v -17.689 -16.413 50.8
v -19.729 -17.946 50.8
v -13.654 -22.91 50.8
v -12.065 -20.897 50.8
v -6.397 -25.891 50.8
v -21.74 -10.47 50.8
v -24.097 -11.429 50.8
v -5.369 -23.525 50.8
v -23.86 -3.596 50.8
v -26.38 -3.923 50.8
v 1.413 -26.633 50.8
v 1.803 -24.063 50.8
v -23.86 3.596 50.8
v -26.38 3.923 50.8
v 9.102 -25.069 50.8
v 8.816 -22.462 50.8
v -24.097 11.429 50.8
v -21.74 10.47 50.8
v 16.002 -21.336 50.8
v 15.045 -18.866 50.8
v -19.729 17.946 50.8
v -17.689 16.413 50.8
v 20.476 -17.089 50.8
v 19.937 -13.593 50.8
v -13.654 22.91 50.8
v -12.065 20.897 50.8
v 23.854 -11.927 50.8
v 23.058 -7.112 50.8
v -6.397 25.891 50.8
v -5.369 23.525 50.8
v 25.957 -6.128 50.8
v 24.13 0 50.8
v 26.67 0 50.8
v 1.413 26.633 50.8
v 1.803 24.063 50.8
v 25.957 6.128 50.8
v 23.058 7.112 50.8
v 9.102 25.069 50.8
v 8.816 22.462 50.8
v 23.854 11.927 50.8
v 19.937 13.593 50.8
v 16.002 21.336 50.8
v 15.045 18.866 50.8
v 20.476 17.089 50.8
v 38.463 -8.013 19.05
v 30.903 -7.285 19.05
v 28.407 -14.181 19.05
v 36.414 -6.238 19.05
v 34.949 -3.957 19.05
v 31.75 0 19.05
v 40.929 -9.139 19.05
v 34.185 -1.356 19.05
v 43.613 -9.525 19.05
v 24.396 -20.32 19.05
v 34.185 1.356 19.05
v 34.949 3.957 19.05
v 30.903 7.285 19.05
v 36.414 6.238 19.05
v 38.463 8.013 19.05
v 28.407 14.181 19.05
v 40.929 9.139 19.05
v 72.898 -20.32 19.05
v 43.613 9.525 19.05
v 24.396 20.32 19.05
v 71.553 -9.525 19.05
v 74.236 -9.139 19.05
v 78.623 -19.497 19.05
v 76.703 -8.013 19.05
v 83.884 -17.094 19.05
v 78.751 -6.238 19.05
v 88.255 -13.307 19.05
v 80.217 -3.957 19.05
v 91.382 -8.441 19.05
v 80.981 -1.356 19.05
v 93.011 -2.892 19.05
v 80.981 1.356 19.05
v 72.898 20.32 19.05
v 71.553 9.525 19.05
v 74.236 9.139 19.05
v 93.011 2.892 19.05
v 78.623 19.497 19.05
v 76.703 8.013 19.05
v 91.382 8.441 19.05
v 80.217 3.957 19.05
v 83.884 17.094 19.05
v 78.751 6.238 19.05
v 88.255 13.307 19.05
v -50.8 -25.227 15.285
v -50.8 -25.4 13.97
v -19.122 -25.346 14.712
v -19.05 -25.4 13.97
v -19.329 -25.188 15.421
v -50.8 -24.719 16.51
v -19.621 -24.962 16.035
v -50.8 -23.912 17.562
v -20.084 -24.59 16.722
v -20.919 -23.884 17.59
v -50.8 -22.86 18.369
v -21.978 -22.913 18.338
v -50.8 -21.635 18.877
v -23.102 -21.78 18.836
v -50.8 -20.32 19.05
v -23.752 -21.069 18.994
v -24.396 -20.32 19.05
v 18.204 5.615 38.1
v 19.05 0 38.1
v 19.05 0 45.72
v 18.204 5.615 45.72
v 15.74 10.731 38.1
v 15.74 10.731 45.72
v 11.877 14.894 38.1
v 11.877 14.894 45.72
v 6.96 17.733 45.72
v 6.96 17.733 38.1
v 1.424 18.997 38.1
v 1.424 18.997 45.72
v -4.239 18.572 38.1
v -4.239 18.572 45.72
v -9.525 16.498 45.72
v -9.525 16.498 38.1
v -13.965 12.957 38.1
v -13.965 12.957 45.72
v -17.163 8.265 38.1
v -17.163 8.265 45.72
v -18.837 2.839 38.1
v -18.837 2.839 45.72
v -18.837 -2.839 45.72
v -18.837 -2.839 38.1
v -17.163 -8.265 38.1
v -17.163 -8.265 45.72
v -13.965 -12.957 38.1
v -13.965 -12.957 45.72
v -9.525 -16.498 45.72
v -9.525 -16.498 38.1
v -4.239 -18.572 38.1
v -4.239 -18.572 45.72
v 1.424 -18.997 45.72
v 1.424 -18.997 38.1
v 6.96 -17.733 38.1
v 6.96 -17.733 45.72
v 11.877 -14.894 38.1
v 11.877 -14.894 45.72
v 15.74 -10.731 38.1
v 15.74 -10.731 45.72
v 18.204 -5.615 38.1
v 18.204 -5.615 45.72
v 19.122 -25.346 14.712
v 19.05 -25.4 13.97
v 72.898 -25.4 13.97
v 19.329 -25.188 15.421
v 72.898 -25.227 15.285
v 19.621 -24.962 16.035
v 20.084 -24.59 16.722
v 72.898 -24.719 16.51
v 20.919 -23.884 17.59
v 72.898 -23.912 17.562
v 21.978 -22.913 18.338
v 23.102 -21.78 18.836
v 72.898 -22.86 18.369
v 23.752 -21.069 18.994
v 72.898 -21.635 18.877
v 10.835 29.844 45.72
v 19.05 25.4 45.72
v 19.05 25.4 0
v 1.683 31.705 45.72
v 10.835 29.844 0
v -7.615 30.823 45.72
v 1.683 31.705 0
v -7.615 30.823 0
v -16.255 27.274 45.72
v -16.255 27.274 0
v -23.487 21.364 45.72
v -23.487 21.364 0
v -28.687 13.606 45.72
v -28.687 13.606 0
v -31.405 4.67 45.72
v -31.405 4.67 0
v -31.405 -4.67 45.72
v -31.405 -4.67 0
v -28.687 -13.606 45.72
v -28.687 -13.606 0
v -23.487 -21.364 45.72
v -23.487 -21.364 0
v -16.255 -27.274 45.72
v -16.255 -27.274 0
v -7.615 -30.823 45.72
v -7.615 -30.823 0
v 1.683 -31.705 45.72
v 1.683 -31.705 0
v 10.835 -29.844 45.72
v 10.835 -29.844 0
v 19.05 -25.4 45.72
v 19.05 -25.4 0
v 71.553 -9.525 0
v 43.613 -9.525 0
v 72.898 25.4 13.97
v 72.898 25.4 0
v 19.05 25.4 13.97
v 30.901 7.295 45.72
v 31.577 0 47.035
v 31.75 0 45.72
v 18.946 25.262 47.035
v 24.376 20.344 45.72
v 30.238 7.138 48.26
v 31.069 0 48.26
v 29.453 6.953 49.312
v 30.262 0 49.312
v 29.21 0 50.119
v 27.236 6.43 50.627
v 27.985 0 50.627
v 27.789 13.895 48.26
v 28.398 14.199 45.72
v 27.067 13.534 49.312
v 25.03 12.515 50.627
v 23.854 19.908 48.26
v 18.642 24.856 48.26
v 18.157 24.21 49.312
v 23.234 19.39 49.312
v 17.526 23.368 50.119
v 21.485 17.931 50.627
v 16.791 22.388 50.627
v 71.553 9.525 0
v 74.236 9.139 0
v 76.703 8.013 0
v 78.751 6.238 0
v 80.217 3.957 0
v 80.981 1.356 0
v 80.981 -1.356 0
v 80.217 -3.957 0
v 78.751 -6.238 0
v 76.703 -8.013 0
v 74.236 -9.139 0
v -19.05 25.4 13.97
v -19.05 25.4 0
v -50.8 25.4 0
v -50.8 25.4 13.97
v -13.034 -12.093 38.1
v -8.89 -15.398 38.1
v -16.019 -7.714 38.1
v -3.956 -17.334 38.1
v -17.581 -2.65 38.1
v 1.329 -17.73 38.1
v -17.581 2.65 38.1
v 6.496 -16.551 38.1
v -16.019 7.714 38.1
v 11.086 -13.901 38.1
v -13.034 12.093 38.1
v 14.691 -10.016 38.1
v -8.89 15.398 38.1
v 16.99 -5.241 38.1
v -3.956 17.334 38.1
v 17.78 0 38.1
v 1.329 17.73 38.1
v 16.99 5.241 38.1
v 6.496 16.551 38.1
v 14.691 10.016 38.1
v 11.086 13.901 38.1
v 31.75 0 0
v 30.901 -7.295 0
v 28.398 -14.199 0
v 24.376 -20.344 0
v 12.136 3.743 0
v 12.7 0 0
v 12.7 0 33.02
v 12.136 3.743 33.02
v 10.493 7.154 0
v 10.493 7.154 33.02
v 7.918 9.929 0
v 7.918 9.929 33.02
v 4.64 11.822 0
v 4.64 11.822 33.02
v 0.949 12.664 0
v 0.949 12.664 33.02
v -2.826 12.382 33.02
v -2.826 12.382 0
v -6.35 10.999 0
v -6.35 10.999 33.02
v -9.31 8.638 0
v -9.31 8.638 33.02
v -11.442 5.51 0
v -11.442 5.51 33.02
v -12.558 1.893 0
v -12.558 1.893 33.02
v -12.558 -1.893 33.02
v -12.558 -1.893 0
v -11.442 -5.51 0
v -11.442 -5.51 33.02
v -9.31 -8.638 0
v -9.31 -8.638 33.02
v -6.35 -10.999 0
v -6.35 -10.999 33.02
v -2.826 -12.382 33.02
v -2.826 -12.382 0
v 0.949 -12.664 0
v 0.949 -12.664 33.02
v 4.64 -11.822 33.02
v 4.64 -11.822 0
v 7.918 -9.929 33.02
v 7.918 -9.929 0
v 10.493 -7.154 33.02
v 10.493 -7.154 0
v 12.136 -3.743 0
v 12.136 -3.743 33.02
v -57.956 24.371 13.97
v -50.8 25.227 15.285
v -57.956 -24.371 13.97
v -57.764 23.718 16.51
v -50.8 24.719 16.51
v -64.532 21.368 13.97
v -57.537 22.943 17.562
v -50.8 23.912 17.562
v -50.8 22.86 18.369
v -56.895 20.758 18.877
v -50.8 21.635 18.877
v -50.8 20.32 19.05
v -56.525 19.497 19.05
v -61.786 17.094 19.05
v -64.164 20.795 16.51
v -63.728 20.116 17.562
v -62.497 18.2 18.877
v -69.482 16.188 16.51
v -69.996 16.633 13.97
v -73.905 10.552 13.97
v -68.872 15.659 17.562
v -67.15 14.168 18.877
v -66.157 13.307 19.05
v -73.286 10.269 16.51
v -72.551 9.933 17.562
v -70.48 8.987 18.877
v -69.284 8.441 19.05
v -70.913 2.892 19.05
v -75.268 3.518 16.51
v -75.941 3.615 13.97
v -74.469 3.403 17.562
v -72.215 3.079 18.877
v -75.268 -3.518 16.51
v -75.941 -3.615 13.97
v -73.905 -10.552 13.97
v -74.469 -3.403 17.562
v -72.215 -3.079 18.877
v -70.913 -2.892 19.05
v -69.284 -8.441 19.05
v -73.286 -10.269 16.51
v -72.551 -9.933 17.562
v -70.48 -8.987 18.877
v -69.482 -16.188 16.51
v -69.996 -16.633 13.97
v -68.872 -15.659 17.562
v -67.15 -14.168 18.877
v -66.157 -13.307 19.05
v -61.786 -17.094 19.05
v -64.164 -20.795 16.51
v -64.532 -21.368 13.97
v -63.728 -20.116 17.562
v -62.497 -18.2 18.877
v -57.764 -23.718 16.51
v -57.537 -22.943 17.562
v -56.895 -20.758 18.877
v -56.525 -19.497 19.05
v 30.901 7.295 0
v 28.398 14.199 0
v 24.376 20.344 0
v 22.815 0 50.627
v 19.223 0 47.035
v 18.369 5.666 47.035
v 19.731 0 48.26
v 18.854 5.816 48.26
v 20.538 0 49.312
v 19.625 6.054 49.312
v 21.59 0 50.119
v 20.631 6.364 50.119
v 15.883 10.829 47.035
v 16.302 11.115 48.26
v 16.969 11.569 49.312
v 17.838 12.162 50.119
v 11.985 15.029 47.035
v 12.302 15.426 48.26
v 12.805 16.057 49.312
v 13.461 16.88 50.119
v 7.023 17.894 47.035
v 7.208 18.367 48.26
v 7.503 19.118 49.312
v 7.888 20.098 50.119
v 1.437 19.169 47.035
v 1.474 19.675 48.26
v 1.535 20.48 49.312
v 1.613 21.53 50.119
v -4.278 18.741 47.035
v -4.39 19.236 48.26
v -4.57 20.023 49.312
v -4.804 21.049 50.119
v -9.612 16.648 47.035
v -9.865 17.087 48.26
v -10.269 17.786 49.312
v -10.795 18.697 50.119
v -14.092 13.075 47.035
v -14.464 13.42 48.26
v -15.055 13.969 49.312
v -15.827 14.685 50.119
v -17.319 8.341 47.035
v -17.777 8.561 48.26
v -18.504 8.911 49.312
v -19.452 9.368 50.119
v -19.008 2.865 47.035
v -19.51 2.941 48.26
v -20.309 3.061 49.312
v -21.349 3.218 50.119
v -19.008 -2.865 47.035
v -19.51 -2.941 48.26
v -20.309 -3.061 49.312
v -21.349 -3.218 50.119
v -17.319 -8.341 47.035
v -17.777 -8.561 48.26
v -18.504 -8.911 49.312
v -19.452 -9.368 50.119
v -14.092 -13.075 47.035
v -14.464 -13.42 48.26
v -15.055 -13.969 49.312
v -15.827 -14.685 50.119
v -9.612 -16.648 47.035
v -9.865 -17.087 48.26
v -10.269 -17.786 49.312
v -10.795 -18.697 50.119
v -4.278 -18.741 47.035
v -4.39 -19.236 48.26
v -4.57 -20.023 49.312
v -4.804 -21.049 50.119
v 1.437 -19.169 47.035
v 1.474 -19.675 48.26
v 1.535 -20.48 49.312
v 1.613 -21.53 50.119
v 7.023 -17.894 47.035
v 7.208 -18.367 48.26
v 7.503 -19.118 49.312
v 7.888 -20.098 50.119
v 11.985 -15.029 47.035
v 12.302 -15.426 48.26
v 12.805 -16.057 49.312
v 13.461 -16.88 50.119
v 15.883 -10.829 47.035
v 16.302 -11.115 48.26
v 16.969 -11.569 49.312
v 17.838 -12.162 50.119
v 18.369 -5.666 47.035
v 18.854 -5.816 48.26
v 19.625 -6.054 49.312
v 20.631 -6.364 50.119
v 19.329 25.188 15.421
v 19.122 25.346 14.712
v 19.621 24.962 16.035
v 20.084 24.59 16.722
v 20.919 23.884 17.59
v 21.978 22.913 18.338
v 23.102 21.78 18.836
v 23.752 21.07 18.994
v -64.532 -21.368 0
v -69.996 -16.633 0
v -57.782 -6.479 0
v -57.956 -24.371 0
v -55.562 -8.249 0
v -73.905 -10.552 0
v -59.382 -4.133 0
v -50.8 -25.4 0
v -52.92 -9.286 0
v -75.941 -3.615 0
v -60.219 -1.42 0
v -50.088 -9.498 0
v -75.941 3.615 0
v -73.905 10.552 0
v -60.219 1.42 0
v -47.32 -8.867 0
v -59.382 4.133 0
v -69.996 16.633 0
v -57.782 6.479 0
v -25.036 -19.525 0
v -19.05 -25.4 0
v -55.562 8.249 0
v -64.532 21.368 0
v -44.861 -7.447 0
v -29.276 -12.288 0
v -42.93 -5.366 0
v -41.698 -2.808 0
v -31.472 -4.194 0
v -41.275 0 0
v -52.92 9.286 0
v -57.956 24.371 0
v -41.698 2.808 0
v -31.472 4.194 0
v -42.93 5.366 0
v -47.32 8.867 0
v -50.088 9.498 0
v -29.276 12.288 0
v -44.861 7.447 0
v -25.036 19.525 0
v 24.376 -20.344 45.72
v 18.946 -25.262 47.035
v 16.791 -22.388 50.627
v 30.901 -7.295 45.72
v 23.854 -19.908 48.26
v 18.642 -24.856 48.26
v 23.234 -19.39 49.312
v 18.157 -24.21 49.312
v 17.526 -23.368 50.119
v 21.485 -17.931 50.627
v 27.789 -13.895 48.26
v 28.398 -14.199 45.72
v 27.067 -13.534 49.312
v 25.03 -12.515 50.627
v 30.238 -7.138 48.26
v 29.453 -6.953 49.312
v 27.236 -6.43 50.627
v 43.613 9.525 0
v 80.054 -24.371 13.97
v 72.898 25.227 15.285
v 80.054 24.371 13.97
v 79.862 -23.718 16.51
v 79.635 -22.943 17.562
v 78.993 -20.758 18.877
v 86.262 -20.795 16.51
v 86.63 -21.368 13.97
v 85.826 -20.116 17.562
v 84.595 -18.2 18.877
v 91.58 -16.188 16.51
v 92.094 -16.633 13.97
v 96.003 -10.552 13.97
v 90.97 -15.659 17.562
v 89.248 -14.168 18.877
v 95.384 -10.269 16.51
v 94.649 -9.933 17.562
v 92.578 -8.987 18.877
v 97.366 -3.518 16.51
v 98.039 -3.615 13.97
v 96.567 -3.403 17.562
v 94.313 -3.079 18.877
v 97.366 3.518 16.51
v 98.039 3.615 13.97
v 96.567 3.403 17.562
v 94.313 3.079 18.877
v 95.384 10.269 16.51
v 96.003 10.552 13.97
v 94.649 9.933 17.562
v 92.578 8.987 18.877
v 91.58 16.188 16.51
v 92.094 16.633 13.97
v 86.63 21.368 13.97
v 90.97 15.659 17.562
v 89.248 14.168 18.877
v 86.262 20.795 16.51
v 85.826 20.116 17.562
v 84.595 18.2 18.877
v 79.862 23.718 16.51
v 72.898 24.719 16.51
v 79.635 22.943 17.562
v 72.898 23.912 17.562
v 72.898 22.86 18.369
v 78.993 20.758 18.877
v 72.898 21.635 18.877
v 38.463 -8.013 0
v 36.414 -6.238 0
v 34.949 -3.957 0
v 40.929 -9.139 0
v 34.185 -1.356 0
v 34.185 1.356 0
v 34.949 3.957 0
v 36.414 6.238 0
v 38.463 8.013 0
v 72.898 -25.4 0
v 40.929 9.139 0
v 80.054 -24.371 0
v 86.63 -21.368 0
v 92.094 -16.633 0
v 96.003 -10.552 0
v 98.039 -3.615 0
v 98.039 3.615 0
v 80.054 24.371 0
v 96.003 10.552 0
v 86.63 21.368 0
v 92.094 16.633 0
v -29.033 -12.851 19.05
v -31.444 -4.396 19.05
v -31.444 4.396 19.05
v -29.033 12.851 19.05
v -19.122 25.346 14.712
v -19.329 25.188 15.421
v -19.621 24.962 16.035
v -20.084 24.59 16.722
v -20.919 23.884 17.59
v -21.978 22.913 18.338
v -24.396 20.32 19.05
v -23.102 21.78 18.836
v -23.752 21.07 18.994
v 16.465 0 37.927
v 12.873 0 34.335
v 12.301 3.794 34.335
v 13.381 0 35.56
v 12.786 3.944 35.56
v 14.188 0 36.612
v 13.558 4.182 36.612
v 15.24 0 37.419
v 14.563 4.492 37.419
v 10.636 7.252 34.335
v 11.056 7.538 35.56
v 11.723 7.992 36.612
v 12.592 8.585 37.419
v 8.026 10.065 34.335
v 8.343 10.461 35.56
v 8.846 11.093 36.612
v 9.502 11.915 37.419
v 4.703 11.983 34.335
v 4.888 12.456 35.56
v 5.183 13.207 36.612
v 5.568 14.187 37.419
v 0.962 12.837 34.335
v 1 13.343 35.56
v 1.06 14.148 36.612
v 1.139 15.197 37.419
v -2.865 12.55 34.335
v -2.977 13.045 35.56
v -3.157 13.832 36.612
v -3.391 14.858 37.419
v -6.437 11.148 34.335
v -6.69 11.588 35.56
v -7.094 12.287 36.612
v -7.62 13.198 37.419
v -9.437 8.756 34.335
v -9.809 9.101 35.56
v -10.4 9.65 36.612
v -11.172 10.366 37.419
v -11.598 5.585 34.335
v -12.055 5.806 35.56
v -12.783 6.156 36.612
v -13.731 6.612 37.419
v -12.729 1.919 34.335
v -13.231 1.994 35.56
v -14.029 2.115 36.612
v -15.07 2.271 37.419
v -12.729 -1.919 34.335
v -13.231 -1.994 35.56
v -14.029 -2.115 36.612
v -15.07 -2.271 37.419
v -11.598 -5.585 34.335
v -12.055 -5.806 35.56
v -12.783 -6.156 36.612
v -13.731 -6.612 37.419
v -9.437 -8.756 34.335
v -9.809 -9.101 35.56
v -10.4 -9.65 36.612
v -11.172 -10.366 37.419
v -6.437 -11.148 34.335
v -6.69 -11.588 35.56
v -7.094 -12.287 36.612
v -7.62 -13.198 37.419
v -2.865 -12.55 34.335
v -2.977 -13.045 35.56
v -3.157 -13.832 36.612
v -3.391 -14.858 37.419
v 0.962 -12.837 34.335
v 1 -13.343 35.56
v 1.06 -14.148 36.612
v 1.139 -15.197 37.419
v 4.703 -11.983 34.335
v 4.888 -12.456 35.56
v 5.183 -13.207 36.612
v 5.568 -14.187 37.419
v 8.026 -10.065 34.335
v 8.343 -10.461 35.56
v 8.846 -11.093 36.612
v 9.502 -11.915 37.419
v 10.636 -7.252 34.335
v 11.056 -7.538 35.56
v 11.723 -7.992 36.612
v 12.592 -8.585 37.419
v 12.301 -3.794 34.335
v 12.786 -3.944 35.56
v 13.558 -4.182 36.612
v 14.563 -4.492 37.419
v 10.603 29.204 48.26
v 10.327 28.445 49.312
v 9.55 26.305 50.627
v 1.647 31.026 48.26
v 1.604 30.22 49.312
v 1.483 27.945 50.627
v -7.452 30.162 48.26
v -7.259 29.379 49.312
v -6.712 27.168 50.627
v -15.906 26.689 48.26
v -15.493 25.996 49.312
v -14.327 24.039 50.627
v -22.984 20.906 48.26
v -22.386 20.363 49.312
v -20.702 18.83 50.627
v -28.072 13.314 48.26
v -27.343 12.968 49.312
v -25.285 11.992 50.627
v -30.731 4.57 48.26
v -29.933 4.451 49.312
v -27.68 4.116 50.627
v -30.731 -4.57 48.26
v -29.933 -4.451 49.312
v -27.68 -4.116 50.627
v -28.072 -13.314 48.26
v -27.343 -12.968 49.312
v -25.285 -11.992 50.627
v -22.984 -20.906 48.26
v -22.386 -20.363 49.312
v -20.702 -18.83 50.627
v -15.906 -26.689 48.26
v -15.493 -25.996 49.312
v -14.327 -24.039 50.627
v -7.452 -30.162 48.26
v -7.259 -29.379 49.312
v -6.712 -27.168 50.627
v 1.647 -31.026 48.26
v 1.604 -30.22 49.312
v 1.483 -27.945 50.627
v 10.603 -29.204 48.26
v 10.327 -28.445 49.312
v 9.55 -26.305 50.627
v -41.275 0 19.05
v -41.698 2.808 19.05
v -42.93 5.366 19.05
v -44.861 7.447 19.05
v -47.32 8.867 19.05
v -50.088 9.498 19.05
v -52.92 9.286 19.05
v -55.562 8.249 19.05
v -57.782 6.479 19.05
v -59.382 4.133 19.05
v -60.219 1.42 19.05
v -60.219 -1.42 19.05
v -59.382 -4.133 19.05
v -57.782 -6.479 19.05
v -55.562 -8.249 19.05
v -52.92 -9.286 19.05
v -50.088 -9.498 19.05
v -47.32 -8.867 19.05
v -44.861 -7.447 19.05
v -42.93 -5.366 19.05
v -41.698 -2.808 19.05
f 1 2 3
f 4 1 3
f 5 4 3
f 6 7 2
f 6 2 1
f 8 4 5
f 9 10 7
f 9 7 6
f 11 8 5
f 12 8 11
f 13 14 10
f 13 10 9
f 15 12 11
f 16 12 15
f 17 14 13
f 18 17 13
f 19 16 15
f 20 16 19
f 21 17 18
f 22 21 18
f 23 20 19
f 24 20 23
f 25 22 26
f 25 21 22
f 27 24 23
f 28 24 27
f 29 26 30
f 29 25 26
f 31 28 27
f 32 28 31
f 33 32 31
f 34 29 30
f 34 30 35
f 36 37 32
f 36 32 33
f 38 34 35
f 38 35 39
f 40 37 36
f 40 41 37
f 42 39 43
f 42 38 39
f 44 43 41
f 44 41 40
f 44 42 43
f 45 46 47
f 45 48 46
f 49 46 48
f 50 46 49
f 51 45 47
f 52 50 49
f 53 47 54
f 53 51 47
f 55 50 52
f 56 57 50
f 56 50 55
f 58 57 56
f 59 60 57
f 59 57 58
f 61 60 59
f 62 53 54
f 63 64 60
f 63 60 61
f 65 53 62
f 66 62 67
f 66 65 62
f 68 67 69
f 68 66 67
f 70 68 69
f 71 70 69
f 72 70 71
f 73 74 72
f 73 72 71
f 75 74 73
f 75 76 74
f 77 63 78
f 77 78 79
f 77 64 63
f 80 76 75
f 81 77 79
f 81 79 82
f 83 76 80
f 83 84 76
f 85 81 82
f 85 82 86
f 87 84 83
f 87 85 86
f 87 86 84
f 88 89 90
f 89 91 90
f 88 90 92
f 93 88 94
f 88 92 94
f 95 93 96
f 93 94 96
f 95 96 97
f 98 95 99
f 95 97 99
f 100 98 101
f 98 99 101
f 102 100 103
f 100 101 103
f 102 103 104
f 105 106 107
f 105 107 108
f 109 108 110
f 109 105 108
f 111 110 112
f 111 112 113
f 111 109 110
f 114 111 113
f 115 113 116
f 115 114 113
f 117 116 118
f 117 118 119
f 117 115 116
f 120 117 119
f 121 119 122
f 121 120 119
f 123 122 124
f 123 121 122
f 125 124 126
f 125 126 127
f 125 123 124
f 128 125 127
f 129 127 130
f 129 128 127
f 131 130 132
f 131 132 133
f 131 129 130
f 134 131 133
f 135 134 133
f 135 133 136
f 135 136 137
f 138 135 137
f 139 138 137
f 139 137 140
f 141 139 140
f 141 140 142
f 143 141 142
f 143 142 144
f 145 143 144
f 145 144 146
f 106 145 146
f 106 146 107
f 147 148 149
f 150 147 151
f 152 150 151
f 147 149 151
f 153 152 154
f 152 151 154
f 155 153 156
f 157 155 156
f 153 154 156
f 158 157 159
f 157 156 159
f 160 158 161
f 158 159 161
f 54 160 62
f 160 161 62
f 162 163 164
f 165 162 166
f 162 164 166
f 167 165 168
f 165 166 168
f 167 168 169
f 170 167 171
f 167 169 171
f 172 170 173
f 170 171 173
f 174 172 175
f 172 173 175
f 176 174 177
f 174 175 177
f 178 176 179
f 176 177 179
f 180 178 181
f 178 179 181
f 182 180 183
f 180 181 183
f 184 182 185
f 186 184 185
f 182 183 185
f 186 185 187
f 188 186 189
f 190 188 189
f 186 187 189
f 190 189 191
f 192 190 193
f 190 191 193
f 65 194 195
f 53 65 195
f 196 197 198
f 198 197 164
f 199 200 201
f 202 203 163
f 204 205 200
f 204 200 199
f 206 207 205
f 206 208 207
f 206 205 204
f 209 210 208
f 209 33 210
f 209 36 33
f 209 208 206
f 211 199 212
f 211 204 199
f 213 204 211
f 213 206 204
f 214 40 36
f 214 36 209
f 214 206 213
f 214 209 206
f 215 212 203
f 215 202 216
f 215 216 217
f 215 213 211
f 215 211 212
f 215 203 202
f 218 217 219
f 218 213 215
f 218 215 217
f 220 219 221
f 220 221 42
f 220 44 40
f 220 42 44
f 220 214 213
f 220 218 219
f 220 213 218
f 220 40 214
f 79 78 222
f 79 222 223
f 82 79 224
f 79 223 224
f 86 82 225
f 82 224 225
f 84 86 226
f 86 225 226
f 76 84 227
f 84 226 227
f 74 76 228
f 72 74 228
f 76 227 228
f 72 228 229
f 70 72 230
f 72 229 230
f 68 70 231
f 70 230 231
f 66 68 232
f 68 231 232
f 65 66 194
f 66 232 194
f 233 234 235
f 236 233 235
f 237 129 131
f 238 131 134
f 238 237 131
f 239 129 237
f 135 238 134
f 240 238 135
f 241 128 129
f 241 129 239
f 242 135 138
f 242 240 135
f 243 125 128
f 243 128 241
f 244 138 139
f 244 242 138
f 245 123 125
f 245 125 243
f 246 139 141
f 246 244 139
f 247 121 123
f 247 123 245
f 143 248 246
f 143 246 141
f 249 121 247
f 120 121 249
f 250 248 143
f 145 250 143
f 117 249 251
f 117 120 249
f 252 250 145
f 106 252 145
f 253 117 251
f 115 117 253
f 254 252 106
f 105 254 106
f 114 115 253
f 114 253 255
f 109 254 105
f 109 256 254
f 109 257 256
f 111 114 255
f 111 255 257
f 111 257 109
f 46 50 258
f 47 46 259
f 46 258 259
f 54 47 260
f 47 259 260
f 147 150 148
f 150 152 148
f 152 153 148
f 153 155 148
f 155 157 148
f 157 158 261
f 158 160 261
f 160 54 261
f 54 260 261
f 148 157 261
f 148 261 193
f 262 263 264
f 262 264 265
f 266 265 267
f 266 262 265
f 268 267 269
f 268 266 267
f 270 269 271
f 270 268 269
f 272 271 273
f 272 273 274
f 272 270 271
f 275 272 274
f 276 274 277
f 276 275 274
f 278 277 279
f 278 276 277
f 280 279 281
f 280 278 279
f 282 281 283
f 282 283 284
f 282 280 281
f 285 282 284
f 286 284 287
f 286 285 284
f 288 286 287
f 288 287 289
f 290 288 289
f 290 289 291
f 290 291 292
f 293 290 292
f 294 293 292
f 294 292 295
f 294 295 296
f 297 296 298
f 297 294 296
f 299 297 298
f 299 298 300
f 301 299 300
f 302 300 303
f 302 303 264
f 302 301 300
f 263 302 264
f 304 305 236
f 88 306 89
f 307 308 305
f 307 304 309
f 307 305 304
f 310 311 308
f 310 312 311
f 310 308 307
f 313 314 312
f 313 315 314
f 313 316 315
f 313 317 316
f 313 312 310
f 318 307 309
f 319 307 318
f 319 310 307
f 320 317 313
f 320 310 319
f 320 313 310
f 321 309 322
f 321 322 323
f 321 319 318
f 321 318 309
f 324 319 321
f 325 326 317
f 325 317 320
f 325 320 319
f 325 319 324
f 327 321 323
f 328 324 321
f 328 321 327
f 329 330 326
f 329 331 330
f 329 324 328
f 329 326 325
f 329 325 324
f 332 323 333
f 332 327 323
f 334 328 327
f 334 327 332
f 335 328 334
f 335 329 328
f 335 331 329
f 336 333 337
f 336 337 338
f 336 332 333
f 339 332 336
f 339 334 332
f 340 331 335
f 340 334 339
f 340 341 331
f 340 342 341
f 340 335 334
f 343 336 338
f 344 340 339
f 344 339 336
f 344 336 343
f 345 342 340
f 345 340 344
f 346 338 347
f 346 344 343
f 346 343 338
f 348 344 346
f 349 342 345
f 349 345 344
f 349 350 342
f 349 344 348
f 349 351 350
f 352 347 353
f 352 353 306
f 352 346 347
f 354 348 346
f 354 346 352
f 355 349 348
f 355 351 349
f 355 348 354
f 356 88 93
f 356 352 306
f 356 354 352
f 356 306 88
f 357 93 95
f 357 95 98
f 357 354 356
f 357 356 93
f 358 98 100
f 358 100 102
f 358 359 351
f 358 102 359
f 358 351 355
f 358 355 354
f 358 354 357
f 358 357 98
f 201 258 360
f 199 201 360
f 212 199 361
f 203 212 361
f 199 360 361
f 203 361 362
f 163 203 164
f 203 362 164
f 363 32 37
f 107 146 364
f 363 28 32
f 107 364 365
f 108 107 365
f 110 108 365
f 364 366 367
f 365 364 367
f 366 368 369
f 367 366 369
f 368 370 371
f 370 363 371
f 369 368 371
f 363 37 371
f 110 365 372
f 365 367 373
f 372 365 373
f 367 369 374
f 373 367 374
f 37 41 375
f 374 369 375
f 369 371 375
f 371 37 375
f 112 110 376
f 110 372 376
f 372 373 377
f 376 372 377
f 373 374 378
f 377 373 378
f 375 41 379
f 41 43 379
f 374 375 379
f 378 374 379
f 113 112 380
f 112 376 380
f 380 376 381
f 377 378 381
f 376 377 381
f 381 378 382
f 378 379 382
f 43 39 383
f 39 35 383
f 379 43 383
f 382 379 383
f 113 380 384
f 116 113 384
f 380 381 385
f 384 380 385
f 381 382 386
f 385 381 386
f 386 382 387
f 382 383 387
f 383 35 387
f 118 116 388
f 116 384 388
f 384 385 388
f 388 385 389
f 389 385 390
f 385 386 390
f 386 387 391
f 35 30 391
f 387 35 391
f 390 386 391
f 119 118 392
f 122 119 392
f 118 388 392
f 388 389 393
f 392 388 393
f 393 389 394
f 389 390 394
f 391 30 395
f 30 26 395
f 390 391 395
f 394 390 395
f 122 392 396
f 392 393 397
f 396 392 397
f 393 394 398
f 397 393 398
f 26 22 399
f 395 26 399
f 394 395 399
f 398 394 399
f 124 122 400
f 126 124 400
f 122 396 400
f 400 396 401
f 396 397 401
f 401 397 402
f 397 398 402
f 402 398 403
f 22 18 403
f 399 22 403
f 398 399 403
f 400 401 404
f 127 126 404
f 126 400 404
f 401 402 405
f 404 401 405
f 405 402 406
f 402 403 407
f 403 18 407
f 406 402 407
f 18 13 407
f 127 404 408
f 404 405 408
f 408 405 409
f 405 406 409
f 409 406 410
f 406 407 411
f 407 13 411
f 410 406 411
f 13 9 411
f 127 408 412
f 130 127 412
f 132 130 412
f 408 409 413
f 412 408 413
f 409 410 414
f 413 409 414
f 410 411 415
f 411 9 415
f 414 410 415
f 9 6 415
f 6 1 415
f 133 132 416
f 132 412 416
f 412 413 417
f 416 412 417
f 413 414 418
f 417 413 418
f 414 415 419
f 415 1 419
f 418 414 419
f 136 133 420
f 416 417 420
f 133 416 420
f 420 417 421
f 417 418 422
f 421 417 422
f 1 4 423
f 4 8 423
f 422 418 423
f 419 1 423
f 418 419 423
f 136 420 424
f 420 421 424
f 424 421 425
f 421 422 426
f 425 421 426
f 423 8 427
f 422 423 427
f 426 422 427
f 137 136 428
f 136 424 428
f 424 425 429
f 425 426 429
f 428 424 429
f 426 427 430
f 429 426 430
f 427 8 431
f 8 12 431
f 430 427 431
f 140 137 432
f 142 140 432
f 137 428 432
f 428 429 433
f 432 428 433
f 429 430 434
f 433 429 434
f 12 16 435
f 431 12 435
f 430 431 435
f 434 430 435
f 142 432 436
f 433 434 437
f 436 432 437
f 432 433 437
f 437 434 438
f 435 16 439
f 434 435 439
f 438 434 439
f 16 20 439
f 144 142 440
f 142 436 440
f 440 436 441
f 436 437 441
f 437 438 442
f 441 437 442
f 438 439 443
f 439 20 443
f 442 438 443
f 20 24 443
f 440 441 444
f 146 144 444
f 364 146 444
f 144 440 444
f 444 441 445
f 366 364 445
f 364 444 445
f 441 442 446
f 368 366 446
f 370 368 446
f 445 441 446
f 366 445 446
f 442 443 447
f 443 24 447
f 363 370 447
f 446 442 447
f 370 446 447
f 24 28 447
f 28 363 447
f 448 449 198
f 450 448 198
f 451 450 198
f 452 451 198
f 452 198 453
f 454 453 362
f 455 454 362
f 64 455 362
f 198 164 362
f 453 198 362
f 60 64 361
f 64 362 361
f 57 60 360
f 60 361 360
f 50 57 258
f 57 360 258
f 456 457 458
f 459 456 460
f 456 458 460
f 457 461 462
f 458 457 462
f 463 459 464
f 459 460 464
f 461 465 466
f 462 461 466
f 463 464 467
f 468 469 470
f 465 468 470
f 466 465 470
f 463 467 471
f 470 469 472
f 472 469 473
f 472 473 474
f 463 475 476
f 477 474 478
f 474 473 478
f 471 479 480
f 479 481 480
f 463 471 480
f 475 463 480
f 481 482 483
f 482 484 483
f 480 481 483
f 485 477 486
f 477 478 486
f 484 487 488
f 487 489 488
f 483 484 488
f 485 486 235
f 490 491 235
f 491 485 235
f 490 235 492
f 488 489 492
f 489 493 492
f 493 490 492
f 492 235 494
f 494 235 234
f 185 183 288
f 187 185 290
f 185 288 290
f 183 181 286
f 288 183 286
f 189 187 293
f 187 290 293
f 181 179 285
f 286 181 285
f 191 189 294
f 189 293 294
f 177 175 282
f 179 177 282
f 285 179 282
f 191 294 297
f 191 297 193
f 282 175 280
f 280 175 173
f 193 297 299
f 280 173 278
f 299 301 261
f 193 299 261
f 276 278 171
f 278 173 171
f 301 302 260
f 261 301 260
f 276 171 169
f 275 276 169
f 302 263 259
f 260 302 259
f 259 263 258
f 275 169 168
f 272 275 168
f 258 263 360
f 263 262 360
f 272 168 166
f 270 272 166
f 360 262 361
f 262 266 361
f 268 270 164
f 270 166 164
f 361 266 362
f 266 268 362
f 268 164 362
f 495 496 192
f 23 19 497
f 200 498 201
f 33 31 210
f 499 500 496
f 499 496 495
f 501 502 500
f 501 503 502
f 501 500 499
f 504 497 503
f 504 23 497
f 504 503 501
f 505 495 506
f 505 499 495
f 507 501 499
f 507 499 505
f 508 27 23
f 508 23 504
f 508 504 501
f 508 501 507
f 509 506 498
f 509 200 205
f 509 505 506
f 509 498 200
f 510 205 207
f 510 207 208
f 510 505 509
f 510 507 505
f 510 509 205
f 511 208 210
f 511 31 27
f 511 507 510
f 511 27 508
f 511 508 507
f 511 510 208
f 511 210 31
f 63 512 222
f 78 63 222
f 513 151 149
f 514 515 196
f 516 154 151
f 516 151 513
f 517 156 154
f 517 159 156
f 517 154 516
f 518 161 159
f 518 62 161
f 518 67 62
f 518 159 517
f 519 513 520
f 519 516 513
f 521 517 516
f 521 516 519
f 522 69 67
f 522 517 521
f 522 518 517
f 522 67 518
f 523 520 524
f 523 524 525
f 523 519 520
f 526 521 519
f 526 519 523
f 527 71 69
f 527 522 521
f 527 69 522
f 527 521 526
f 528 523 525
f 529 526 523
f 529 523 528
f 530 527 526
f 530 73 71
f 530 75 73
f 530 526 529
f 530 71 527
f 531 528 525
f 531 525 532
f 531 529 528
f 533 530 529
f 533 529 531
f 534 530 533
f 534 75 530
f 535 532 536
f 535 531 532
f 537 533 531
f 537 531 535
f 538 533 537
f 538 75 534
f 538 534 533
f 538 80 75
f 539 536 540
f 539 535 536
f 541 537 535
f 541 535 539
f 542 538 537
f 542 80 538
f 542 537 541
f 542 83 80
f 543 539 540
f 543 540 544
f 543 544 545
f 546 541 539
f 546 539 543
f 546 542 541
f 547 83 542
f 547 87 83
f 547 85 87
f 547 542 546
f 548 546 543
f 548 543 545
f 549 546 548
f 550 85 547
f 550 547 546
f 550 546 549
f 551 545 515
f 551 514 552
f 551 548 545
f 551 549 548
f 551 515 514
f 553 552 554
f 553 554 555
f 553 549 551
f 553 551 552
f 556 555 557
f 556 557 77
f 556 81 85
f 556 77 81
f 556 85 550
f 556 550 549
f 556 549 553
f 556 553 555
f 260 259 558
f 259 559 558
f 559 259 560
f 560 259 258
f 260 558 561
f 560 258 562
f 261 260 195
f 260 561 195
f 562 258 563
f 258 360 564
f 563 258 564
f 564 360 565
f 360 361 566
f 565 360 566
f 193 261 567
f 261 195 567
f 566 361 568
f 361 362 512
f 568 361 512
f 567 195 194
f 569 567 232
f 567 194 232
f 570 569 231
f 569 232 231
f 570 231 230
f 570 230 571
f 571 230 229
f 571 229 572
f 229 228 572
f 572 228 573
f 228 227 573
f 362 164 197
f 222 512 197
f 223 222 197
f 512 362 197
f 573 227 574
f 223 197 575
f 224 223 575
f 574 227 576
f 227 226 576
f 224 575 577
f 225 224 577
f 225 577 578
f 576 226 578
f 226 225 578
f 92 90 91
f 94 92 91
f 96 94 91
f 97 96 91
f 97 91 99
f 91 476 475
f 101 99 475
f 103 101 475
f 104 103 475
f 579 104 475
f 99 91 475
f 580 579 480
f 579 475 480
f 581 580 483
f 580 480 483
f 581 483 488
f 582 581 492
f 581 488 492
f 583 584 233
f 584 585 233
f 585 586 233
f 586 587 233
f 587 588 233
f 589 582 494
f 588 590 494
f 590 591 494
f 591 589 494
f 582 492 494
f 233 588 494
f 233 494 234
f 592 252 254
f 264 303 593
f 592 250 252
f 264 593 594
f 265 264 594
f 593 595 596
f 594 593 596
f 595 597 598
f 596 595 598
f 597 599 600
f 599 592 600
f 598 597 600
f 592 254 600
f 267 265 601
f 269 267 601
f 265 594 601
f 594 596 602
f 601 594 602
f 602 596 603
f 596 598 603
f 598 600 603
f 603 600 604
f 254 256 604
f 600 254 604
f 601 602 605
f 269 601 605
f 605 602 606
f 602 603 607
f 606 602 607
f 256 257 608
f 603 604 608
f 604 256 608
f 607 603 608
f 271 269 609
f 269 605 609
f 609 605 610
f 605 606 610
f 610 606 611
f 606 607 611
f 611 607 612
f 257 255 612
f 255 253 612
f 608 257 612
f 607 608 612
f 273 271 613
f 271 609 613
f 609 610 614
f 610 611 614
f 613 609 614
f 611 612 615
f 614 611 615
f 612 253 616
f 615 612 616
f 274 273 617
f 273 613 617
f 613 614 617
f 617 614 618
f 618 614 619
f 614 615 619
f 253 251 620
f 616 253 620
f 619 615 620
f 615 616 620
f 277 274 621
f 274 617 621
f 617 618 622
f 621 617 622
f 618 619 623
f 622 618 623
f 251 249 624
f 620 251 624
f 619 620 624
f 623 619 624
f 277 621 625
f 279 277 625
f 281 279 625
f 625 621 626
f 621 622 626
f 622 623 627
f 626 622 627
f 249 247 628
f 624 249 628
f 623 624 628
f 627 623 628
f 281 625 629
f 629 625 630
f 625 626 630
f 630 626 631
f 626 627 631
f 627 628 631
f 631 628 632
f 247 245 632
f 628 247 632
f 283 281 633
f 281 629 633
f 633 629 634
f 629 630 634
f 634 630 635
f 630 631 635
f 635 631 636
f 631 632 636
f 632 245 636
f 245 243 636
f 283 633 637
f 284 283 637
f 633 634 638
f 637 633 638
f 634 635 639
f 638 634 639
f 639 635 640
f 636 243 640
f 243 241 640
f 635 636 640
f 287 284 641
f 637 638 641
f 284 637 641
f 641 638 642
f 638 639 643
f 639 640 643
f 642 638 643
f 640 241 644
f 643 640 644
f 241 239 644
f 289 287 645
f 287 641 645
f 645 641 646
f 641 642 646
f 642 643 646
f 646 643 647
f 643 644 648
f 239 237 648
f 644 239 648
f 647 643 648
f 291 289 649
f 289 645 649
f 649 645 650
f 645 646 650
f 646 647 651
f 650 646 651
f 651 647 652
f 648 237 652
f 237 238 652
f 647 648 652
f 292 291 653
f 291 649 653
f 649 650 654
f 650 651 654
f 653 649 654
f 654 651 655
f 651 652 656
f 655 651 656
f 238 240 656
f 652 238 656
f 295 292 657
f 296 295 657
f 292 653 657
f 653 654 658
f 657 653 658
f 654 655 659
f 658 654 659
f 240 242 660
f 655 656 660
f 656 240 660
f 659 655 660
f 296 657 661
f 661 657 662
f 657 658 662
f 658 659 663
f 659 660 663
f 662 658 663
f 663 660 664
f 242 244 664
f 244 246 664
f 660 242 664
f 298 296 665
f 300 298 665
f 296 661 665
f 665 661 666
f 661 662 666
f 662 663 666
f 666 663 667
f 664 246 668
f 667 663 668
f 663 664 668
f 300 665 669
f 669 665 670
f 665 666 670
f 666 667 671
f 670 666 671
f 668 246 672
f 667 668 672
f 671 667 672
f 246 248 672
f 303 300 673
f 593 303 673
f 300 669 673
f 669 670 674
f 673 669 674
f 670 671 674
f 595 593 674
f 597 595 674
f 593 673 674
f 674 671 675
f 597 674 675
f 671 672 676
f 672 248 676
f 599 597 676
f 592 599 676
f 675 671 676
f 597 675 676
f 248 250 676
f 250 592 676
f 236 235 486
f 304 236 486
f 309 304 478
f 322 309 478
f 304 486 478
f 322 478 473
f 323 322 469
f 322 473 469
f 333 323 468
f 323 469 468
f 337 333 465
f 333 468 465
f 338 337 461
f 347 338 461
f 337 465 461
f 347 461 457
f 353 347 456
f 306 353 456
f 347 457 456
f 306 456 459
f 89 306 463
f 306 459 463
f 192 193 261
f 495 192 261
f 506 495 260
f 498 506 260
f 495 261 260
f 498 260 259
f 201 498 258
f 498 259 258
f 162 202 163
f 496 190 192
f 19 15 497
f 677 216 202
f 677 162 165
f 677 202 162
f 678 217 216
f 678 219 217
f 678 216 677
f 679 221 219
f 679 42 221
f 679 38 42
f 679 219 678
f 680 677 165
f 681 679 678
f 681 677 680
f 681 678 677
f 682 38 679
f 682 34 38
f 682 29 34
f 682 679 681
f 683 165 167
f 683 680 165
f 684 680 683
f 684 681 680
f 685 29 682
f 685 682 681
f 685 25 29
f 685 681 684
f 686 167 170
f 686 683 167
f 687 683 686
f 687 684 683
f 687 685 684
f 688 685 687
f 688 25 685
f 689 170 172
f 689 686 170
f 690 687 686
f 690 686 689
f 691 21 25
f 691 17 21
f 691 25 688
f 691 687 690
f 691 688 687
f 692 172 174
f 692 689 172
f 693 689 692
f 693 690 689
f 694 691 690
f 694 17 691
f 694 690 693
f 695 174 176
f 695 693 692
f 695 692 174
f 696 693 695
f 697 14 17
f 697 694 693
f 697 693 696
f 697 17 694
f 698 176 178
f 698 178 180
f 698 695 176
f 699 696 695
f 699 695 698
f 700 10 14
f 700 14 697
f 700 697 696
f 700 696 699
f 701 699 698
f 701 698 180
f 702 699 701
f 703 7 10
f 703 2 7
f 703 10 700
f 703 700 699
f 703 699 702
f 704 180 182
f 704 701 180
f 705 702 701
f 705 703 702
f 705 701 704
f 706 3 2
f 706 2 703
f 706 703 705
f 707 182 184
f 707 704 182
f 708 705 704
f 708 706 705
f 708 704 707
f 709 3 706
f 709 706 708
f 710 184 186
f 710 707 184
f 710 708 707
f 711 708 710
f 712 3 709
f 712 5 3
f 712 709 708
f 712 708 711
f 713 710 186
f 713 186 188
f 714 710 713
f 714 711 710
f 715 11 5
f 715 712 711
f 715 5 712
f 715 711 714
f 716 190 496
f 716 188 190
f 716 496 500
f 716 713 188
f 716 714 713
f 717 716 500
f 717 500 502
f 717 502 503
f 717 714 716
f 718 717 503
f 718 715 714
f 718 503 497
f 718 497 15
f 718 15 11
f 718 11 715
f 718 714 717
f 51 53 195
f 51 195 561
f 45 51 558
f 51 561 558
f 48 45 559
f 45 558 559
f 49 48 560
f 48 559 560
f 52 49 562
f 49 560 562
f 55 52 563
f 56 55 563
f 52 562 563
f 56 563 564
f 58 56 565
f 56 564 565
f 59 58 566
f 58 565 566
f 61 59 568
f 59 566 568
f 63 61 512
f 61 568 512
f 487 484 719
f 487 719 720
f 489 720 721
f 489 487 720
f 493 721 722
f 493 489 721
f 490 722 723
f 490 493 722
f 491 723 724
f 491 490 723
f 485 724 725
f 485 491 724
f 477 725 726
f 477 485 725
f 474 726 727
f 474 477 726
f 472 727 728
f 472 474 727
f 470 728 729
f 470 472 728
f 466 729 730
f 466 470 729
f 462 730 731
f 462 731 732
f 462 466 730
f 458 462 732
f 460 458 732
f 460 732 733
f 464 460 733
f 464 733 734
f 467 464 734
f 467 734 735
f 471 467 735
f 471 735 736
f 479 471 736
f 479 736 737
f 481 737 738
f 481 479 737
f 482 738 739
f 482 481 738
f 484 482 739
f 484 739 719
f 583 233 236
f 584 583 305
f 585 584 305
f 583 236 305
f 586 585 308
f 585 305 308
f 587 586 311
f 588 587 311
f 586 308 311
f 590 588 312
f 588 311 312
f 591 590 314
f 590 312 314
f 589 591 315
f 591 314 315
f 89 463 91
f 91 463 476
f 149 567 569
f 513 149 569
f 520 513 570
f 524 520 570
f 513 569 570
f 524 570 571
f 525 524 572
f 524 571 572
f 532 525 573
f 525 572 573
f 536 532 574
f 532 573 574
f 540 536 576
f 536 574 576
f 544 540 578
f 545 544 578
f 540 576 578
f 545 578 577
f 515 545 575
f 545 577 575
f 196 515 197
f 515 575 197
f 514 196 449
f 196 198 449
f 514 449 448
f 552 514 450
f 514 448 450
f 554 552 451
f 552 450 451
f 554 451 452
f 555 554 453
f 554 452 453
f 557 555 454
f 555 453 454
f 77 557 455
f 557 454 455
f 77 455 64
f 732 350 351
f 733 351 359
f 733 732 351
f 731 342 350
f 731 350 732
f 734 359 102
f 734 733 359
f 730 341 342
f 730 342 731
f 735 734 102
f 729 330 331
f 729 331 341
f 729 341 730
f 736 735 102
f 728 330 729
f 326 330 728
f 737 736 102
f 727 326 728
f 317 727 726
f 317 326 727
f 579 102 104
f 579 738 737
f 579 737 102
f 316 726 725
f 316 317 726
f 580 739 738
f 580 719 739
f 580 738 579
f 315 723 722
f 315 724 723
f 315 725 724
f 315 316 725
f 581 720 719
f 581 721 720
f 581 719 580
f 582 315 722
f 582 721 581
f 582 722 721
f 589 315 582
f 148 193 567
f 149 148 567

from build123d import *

# Parameters (mm, degrees)
F0_R     = 9.525
F1_DEPTH = 19.05
F0_R_2   = 19.05
F2_DEPTH = 50.8
F0_R_3   = 12.7
F3_DEPTH = 38.1
F4_R     = 5.08
F4_2_R   = 5.08
F4_3_R   = 5.08


# Not quite as in the source:
# - a feature names something its author has since deleted; it is built from what else it names


with BuildPart() as f1:
    # F0 (on Top) → F1 (new body)
    with BuildSketch(Plane.XY):
        with BuildLine():
            ThreePointArc((-19.05, -25.4), (-31.75, 0), (-19.05, 25.4))
            Line((-19.05, 25.4), (-50.8, 25.4))
            ThreePointArc((-50.8, 25.4), (-76.2, 0), (-50.8, -25.4))
            Line((-50.8, -25.4), (-19.05, -25.4))
        make_face()
        with Locations((-50.8, 0)):
            Circle(F0_R, mode=Mode.SUBTRACT)
    extrude(amount=F1_DEPTH)

    # F4
    f4_edges = [f1.edges().sort_by_distance(p)[0] for p in [
        (-76.2, 0, 19.05),
    ]]
    fillet(f4_edges, radius=F4_R)


with BuildPart() as f1b:
    # F0 (on Top) → F1, piece 2 (new body)
    with BuildSketch(Plane.XY):
        with BuildLine():
            ThreePointArc((19.05, 25.4), (28.3980633142, 14.1990316571), (31.75, 0))
            ThreePointArc((31.75, 0), (28.3980633142, -14.1990316571), (19.05, -25.4))
            Line((19.05, -25.4), (72.898, -25.4))
            ThreePointArc((72.898, -25.4), (98.298, 0), (72.898, 25.4))
            Line((72.898, 25.4), (19.05, 25.4))
        make_face()
        with BuildLine():
            ThreePointArc((43.6129720223, -9.525), (34.0879720223, 0), (43.6129720223, 9.525))
            Line((43.6129720223, 9.525), (71.5529720223, 9.525))
            ThreePointArc((71.5529720223, 9.525), (81.0779720223, 0), (71.5529720223, -9.525))
            Line((71.5529720223, -9.525), (43.6129720223, -9.525))
        make_face(mode=Mode.SUBTRACT)
    extrude(amount=F1_DEPTH)

    # F4#2
    f4_2_edges = [f1b.edges().sort_by_distance(p)[0] for p in [
        (98.298, 0, 19.05),
    ]]
    fillet(f4_2_edges, radius=F4_2_R)


with BuildPart() as f2:
    # F0 (on Top) → F2 (new body)
    with BuildSketch(Plane.XY):
        with BuildLine():
            ThreePointArc((19.05, -25.4), (28.3980633142, -14.1990316571), (31.75, 0))
            ThreePointArc((31.75, 0), (28.3980633142, 14.1990316571), (19.05, 25.4))
            ThreePointArc((19.05, 25.4), (0, 31.75), (-19.05, 25.4))
            ThreePointArc((-19.05, 25.4), (-31.75, 0), (-19.05, -25.4))
            ThreePointArc((-19.05, -25.4), (0, -31.75), (19.05, -25.4))
        make_face()
        Circle(F0_R_2, mode=Mode.SUBTRACT)
    extrude(amount=F2_DEPTH)

    # F0 (on Top) → F3 (join)
    with BuildSketch(Plane.XY):
        Circle(F0_R_2)
        Circle(F0_R_3, mode=Mode.SUBTRACT)
    extrude(amount=F3_DEPTH)

    # F4#3
    f4_3_edges = [f2.edges().sort_by_distance(p)[0] for p in [
        (-19.05, -25.4, 50.8),
        (-19.05, 0, 50.8),
        (-12.7, 0, 38.1),
    ]]
    fillet(f4_3_edges, radius=F4_3_R)


solid = Compound([f1.part, f1b.part, f2.part])
